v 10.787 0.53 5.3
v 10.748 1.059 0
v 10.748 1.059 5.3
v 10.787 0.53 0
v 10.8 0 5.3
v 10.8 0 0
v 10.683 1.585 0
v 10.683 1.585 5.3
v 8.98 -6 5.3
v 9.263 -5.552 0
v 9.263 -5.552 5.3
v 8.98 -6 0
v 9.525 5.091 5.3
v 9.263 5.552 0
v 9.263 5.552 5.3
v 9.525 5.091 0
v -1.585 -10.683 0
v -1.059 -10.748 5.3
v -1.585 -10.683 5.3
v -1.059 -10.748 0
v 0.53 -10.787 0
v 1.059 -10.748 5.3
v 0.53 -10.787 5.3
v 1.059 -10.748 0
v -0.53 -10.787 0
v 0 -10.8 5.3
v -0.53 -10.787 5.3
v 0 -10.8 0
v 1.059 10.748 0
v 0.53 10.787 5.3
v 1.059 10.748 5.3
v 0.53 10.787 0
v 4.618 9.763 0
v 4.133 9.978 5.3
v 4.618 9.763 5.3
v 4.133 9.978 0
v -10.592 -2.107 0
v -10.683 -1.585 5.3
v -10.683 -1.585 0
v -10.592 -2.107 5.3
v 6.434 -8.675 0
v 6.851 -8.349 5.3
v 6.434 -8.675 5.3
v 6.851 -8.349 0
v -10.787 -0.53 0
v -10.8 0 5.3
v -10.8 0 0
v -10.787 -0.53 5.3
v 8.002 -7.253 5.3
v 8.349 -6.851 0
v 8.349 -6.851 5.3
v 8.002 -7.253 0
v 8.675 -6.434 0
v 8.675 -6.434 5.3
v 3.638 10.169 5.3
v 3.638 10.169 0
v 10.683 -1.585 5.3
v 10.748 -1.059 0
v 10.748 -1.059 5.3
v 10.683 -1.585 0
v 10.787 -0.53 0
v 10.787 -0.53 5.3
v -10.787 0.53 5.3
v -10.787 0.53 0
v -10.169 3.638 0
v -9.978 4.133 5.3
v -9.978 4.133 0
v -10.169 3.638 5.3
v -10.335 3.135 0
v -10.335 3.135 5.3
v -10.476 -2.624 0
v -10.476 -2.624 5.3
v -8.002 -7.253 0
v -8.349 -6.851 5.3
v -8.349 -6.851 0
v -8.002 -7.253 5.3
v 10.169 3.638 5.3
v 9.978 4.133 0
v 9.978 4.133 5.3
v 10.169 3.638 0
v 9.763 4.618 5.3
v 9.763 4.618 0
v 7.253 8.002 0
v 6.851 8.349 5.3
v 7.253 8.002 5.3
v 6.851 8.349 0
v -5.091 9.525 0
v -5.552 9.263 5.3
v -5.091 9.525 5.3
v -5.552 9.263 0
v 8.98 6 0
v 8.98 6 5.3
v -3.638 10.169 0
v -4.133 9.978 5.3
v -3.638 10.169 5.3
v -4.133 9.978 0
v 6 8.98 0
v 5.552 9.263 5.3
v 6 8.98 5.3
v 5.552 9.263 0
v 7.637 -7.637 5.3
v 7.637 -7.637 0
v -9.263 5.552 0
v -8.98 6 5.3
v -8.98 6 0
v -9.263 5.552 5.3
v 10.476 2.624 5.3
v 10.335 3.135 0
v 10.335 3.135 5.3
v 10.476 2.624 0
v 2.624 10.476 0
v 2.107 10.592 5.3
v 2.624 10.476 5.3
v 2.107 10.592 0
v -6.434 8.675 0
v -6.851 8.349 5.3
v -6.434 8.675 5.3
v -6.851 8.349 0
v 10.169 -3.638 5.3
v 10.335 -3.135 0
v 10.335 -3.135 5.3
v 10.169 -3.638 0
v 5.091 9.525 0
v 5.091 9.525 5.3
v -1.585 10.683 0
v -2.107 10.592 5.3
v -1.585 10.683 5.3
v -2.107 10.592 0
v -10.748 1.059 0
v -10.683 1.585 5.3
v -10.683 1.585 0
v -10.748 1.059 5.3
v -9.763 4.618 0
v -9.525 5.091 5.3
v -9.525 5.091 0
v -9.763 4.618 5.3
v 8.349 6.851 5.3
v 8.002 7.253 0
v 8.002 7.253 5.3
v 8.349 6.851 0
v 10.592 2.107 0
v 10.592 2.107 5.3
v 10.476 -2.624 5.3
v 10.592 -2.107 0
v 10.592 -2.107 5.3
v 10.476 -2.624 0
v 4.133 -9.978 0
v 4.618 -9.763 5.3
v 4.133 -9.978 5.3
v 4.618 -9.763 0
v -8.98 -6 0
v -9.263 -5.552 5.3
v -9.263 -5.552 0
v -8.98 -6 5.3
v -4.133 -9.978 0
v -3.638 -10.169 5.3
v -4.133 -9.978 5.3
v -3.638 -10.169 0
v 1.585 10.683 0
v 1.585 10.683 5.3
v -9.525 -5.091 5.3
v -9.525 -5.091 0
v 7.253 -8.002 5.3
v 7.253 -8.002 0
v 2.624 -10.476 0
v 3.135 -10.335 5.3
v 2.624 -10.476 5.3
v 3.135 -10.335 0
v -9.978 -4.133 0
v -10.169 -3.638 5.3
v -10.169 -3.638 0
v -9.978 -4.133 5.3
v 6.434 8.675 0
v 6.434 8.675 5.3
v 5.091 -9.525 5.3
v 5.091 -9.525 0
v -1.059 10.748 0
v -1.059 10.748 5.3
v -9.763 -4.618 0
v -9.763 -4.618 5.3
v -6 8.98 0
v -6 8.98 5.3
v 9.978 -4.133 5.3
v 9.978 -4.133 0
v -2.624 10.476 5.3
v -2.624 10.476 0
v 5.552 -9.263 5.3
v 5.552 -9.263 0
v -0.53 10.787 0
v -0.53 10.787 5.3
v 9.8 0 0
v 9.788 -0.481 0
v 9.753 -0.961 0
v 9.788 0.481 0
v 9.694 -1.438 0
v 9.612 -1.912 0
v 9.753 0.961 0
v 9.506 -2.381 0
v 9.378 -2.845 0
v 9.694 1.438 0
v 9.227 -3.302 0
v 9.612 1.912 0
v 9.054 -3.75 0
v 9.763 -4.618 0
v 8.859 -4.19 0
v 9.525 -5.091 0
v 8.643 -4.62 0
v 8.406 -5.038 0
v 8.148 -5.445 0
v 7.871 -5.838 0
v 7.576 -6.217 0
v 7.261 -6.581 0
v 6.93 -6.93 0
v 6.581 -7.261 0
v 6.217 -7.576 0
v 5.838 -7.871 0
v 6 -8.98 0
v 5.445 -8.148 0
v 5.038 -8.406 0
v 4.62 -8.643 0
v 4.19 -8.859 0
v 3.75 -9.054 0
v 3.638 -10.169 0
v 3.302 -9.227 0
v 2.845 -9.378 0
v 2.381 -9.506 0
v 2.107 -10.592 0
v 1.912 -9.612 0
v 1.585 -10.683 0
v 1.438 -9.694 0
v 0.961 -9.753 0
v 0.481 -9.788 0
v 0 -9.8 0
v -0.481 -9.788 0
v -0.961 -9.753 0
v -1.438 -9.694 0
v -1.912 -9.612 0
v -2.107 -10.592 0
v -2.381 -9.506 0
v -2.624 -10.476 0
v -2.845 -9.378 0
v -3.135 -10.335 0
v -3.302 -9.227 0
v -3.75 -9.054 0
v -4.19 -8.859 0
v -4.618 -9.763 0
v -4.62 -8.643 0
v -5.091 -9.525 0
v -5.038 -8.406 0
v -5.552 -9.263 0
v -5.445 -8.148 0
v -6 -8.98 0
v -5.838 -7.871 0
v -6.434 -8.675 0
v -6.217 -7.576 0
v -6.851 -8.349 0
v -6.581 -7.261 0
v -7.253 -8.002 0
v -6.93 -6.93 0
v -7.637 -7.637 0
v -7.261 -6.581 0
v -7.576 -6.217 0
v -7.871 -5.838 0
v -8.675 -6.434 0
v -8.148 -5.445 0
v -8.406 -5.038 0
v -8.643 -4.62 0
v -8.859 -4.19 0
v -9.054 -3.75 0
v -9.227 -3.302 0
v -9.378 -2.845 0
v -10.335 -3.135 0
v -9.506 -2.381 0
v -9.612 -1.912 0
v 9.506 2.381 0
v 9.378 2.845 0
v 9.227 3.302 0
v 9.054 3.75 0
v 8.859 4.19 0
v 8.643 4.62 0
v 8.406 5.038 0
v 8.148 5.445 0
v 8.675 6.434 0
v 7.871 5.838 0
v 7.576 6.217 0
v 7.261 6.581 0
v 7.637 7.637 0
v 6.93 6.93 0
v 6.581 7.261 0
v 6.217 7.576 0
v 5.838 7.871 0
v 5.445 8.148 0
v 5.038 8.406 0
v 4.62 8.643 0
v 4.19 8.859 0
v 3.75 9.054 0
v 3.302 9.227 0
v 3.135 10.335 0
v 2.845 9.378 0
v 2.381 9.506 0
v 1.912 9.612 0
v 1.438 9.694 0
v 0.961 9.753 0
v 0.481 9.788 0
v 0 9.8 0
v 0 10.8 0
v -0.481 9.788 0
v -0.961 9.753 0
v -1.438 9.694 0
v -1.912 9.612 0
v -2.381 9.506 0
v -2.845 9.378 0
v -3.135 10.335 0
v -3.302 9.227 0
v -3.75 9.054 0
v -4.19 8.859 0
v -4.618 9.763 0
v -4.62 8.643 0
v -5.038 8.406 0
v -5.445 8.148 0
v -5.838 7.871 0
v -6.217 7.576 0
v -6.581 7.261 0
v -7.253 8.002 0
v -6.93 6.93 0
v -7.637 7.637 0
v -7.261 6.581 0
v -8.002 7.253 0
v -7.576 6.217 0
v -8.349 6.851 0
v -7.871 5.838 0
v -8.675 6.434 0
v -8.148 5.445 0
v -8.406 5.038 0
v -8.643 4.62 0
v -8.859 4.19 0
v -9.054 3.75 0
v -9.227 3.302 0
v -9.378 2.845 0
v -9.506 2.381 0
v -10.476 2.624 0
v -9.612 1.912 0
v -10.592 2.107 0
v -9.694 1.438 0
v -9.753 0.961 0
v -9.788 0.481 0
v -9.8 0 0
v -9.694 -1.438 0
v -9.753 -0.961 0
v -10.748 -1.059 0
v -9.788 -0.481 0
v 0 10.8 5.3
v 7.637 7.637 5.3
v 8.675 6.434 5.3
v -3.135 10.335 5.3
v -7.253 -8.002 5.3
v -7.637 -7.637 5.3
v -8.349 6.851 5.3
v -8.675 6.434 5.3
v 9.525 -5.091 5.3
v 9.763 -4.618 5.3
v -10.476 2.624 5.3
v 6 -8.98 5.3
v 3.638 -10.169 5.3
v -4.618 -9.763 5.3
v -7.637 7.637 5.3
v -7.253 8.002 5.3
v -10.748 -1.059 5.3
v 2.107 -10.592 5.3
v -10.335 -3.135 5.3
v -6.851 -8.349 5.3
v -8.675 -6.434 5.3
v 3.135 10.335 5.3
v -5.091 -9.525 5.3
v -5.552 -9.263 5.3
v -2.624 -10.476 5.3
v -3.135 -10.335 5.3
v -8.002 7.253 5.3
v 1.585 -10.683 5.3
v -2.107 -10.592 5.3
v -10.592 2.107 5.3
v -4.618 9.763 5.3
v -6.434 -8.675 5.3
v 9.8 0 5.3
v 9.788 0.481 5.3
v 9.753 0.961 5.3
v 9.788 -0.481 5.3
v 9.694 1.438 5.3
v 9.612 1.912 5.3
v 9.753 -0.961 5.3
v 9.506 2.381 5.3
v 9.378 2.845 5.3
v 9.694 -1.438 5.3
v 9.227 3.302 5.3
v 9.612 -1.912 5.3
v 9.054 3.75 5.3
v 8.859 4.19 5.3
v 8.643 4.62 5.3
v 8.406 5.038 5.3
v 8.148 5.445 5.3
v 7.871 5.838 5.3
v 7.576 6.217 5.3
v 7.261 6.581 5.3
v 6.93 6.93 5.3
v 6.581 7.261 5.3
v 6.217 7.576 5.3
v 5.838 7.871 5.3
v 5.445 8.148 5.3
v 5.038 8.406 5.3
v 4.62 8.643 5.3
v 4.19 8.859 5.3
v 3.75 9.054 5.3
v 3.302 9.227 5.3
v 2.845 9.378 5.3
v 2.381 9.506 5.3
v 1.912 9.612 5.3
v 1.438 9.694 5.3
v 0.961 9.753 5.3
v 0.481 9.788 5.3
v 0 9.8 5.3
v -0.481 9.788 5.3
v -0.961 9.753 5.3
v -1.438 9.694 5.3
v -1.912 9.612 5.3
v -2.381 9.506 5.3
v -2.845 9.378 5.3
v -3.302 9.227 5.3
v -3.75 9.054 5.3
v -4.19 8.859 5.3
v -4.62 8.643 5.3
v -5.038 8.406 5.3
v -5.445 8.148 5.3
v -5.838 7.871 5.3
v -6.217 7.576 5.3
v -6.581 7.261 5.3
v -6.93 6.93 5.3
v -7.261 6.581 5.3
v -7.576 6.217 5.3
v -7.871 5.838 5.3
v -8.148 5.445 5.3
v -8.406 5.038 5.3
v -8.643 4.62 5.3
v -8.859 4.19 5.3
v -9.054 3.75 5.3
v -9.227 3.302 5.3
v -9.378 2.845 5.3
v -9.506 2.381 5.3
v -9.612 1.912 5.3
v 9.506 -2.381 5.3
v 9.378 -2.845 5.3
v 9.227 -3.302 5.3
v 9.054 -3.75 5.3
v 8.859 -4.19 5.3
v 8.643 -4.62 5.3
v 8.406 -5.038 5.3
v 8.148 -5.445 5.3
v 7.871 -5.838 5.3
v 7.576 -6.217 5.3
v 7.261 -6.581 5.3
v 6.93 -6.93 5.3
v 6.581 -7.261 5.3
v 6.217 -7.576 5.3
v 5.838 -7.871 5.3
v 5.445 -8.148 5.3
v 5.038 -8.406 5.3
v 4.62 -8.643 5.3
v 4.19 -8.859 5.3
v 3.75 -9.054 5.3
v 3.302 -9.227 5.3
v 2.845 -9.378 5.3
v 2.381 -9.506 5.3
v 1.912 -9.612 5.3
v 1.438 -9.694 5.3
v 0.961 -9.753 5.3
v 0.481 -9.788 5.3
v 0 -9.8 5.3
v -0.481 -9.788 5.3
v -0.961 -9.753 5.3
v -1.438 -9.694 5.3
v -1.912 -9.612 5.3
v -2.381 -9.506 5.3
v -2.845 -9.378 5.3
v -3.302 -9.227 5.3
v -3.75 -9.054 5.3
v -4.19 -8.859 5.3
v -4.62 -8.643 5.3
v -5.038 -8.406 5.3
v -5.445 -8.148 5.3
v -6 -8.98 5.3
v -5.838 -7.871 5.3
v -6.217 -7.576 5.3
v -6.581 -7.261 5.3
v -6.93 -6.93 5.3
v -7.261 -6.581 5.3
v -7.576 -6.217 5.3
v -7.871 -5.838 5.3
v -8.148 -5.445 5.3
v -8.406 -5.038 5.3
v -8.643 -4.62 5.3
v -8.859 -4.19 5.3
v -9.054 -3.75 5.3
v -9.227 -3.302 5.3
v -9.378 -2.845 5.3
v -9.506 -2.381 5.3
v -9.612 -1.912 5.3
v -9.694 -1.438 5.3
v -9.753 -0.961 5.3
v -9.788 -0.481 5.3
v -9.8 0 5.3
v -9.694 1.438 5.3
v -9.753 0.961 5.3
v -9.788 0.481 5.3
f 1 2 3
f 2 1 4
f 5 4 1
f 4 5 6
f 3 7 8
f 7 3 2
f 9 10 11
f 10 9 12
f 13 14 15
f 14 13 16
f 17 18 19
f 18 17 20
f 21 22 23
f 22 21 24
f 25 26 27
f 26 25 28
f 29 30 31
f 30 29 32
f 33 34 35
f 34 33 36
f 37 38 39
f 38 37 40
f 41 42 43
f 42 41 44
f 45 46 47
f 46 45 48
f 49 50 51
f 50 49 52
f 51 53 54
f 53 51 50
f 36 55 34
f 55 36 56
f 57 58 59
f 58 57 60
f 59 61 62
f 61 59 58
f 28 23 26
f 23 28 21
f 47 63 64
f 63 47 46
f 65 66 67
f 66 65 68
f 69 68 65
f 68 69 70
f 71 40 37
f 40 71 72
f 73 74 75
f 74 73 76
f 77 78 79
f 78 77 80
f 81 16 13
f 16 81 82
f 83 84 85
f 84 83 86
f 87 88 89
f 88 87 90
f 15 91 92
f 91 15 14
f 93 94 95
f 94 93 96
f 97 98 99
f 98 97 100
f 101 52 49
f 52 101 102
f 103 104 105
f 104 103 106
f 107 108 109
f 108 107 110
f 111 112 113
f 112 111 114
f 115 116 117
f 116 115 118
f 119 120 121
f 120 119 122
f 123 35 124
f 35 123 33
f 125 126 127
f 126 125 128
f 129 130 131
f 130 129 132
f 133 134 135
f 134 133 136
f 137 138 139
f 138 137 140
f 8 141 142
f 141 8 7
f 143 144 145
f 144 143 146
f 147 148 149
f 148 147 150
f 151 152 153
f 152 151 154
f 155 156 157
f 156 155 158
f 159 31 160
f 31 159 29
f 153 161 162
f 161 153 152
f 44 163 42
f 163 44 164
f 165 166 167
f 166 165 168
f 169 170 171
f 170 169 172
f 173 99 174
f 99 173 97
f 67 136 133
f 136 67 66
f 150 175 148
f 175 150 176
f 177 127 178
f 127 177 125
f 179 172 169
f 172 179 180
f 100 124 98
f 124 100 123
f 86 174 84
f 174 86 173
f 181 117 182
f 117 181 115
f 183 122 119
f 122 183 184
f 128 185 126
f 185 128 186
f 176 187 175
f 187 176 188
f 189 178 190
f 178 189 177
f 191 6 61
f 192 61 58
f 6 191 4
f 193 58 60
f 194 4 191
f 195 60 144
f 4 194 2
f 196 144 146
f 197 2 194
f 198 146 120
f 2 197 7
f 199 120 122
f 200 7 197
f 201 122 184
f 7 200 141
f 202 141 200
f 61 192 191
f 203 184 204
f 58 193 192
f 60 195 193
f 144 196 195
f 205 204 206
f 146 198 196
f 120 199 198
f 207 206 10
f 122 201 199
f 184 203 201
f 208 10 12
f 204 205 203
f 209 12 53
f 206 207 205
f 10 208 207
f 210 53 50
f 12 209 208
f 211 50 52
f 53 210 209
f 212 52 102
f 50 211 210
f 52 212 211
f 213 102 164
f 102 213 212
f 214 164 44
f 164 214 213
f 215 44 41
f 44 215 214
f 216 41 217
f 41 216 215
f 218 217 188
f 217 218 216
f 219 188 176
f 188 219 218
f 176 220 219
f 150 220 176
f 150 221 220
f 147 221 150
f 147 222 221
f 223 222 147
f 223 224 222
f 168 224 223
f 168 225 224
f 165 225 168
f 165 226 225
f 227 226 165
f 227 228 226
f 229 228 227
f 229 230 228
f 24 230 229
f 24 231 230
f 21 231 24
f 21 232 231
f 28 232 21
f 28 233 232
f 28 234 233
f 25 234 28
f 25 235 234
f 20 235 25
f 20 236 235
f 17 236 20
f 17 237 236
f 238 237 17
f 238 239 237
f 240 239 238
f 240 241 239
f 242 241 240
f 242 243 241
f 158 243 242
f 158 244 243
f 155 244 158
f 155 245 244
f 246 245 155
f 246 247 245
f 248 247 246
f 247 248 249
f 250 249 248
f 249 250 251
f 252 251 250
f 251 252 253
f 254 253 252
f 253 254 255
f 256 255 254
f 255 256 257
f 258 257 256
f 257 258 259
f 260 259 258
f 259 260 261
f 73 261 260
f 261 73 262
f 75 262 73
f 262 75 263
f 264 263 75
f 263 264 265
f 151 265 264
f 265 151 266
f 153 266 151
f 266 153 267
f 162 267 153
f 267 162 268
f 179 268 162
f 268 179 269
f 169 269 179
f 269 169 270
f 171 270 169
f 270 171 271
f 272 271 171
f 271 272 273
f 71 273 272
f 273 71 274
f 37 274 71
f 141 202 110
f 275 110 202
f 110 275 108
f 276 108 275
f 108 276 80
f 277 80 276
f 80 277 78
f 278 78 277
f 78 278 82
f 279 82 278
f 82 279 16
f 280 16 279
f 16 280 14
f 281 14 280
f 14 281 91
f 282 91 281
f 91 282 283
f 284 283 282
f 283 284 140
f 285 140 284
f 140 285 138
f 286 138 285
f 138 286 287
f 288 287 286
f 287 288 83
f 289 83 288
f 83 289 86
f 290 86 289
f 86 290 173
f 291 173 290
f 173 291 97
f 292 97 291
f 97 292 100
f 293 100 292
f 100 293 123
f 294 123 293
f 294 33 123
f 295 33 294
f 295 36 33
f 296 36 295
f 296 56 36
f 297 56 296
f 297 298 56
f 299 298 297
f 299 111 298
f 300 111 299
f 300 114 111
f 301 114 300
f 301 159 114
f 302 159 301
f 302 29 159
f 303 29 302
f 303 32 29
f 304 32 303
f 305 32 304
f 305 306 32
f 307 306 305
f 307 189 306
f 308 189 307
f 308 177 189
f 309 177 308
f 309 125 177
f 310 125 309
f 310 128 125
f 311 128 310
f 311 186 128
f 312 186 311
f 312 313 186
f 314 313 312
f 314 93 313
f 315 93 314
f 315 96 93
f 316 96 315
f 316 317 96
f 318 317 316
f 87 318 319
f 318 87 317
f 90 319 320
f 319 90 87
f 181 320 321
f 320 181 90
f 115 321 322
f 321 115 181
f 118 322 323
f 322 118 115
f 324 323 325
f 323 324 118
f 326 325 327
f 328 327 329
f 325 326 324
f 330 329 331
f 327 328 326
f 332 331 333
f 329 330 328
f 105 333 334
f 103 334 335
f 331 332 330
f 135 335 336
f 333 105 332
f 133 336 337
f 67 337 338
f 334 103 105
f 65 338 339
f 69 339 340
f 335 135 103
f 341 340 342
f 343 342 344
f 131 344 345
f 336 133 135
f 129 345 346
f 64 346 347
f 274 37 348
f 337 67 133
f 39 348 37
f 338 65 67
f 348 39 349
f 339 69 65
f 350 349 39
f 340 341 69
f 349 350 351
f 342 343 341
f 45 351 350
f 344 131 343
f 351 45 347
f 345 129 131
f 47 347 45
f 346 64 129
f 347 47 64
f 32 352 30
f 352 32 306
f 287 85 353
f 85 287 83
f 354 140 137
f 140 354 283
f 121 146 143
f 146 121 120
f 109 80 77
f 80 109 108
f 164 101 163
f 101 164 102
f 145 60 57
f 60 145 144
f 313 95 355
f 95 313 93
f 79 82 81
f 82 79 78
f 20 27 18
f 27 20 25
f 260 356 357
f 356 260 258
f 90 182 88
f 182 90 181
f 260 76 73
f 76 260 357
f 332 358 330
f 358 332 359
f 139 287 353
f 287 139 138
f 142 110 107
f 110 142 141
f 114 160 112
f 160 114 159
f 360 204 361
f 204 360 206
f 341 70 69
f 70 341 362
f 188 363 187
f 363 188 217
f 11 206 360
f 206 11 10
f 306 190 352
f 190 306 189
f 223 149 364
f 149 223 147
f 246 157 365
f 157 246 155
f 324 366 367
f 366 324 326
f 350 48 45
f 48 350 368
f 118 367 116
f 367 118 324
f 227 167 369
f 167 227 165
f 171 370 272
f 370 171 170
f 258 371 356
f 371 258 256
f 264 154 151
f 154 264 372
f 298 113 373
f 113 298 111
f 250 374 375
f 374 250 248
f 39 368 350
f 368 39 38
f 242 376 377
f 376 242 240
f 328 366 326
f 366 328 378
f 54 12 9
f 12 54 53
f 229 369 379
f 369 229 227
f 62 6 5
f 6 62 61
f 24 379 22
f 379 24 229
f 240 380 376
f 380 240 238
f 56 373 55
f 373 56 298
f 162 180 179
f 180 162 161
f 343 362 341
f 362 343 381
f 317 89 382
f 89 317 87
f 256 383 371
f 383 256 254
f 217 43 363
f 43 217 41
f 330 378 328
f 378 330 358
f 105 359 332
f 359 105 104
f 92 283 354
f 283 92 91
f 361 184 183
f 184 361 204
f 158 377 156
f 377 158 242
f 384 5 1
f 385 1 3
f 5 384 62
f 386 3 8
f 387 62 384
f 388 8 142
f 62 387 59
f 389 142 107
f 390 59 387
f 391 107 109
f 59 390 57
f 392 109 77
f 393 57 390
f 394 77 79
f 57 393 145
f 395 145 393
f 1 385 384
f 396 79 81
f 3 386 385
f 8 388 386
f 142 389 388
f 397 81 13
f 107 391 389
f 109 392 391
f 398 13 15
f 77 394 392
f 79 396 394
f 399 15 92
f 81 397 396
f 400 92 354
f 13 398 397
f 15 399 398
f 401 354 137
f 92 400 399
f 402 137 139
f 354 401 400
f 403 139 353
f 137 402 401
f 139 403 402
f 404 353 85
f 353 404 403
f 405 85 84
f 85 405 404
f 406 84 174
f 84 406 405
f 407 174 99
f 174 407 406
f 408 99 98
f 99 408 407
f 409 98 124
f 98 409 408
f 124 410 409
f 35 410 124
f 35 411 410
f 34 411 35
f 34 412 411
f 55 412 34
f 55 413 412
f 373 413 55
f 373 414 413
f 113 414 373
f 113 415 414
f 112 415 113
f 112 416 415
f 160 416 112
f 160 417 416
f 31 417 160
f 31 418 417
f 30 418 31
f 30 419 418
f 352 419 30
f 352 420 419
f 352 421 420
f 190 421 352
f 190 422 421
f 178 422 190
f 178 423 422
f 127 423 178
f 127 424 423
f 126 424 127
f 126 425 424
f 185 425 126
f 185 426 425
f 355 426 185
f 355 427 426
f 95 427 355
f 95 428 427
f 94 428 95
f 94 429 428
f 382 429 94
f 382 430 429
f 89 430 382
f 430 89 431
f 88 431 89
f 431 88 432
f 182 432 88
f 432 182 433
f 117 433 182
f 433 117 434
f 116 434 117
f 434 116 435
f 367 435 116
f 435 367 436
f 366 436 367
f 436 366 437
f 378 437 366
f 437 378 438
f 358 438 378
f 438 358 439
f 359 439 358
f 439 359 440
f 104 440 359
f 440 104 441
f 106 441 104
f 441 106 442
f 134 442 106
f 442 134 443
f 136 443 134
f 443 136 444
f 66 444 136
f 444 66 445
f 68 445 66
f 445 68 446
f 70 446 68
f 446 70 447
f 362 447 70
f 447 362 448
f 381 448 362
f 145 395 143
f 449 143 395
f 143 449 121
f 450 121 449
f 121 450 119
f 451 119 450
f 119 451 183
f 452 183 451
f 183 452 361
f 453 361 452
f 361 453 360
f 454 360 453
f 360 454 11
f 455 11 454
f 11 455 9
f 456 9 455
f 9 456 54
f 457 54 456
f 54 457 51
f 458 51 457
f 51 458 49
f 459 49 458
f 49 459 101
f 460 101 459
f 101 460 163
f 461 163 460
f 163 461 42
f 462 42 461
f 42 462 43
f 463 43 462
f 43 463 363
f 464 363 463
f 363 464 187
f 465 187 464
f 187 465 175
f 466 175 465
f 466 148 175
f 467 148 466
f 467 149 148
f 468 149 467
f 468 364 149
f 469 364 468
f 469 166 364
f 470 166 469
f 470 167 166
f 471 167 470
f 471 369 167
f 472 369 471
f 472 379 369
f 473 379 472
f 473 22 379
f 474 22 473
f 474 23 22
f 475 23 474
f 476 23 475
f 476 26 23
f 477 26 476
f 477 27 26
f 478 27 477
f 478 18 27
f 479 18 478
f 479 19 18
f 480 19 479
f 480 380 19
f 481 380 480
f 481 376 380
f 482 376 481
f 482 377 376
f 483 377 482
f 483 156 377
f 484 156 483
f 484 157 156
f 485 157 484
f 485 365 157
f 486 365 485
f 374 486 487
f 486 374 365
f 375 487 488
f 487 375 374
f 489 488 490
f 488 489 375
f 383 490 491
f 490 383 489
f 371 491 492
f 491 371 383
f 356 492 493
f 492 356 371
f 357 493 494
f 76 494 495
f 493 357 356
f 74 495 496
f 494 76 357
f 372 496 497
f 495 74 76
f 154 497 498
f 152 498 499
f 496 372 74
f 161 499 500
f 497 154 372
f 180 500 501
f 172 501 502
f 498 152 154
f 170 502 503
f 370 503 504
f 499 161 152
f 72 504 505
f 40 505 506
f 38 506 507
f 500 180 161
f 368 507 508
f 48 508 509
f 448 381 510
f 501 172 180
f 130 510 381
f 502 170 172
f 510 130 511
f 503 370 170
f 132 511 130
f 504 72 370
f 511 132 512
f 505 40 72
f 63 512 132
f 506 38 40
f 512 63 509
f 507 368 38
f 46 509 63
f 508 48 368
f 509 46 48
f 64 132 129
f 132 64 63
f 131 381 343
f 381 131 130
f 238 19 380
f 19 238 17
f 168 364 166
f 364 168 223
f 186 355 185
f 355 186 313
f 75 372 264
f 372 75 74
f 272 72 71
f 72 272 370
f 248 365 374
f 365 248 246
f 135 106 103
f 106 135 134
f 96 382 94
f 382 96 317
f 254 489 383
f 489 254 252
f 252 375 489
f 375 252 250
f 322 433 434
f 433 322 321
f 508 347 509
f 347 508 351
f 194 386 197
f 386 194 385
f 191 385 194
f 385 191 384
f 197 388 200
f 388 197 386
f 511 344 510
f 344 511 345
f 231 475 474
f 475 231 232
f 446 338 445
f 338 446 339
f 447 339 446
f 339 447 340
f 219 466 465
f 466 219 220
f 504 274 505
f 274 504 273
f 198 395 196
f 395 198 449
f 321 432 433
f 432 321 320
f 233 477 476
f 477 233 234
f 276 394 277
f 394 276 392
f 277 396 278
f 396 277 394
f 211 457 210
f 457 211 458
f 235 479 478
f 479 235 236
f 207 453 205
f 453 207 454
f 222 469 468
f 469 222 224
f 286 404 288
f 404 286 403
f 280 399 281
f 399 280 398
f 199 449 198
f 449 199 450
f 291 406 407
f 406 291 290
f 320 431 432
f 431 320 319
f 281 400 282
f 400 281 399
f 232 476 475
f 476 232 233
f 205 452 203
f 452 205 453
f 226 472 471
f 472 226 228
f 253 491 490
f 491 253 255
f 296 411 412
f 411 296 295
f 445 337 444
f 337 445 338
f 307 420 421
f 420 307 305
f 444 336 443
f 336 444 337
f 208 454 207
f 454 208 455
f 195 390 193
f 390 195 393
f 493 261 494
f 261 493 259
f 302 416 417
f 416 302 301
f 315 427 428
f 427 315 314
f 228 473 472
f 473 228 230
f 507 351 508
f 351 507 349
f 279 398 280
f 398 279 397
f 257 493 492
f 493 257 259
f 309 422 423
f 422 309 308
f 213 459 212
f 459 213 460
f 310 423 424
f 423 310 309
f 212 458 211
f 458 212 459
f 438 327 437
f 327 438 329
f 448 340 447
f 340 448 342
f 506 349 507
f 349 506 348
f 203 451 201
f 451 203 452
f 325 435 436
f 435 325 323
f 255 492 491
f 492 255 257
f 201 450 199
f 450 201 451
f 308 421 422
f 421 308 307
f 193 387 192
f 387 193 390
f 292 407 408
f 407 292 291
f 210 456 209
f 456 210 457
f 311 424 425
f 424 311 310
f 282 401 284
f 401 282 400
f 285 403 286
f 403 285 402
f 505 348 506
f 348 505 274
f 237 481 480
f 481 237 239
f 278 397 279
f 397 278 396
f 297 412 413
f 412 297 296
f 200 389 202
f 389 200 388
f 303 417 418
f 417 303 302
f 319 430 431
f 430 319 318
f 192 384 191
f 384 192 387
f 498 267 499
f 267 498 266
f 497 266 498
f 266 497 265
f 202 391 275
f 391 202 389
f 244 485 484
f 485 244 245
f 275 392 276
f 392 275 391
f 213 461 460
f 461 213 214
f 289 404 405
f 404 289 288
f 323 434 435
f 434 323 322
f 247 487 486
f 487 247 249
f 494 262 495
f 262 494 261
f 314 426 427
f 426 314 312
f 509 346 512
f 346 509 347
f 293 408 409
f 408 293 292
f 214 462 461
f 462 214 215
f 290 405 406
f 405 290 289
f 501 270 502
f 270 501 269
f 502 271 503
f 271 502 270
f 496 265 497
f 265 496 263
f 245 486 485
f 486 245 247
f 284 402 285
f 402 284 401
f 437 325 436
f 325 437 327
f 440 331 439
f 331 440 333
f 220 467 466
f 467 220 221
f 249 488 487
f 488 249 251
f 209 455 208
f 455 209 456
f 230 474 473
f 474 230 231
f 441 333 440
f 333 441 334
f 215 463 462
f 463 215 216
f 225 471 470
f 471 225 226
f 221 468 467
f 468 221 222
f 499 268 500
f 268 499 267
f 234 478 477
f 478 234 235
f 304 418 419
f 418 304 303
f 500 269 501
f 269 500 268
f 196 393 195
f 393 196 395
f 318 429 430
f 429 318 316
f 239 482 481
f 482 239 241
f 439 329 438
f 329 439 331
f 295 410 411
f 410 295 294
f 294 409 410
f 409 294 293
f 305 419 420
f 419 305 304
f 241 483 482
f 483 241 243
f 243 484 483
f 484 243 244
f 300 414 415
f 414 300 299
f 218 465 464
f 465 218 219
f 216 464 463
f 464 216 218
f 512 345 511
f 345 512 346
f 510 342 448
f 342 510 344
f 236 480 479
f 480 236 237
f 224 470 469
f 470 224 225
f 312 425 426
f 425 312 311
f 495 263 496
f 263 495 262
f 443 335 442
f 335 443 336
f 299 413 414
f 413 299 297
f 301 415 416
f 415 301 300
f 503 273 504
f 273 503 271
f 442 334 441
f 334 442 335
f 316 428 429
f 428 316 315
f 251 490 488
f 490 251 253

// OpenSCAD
$fn=128;

module radial(r=[10.8, 10.8, 5.3, 1]) {
    // Interpret as: [outer_radius, inner_radius, height, wall_thickness]
    outer_r = r[0];
    inner_r = r[1];
    h       = r[2];
    t       = r[3];

    // If inner_r is given as same as outer_r, treat it as a ring defined by thickness t
    effective_inner = (inner_r >= outer_r) ? max(0, outer_r - t) : inner_r;

    difference() {
        cylinder(h=h, r=outer_r);
        translate([0,0,-0.01]) cylinder(h=h+0.02, r=effective_inner);
    }
}

radial([10.8, 10.8, 5.3, 1]);
